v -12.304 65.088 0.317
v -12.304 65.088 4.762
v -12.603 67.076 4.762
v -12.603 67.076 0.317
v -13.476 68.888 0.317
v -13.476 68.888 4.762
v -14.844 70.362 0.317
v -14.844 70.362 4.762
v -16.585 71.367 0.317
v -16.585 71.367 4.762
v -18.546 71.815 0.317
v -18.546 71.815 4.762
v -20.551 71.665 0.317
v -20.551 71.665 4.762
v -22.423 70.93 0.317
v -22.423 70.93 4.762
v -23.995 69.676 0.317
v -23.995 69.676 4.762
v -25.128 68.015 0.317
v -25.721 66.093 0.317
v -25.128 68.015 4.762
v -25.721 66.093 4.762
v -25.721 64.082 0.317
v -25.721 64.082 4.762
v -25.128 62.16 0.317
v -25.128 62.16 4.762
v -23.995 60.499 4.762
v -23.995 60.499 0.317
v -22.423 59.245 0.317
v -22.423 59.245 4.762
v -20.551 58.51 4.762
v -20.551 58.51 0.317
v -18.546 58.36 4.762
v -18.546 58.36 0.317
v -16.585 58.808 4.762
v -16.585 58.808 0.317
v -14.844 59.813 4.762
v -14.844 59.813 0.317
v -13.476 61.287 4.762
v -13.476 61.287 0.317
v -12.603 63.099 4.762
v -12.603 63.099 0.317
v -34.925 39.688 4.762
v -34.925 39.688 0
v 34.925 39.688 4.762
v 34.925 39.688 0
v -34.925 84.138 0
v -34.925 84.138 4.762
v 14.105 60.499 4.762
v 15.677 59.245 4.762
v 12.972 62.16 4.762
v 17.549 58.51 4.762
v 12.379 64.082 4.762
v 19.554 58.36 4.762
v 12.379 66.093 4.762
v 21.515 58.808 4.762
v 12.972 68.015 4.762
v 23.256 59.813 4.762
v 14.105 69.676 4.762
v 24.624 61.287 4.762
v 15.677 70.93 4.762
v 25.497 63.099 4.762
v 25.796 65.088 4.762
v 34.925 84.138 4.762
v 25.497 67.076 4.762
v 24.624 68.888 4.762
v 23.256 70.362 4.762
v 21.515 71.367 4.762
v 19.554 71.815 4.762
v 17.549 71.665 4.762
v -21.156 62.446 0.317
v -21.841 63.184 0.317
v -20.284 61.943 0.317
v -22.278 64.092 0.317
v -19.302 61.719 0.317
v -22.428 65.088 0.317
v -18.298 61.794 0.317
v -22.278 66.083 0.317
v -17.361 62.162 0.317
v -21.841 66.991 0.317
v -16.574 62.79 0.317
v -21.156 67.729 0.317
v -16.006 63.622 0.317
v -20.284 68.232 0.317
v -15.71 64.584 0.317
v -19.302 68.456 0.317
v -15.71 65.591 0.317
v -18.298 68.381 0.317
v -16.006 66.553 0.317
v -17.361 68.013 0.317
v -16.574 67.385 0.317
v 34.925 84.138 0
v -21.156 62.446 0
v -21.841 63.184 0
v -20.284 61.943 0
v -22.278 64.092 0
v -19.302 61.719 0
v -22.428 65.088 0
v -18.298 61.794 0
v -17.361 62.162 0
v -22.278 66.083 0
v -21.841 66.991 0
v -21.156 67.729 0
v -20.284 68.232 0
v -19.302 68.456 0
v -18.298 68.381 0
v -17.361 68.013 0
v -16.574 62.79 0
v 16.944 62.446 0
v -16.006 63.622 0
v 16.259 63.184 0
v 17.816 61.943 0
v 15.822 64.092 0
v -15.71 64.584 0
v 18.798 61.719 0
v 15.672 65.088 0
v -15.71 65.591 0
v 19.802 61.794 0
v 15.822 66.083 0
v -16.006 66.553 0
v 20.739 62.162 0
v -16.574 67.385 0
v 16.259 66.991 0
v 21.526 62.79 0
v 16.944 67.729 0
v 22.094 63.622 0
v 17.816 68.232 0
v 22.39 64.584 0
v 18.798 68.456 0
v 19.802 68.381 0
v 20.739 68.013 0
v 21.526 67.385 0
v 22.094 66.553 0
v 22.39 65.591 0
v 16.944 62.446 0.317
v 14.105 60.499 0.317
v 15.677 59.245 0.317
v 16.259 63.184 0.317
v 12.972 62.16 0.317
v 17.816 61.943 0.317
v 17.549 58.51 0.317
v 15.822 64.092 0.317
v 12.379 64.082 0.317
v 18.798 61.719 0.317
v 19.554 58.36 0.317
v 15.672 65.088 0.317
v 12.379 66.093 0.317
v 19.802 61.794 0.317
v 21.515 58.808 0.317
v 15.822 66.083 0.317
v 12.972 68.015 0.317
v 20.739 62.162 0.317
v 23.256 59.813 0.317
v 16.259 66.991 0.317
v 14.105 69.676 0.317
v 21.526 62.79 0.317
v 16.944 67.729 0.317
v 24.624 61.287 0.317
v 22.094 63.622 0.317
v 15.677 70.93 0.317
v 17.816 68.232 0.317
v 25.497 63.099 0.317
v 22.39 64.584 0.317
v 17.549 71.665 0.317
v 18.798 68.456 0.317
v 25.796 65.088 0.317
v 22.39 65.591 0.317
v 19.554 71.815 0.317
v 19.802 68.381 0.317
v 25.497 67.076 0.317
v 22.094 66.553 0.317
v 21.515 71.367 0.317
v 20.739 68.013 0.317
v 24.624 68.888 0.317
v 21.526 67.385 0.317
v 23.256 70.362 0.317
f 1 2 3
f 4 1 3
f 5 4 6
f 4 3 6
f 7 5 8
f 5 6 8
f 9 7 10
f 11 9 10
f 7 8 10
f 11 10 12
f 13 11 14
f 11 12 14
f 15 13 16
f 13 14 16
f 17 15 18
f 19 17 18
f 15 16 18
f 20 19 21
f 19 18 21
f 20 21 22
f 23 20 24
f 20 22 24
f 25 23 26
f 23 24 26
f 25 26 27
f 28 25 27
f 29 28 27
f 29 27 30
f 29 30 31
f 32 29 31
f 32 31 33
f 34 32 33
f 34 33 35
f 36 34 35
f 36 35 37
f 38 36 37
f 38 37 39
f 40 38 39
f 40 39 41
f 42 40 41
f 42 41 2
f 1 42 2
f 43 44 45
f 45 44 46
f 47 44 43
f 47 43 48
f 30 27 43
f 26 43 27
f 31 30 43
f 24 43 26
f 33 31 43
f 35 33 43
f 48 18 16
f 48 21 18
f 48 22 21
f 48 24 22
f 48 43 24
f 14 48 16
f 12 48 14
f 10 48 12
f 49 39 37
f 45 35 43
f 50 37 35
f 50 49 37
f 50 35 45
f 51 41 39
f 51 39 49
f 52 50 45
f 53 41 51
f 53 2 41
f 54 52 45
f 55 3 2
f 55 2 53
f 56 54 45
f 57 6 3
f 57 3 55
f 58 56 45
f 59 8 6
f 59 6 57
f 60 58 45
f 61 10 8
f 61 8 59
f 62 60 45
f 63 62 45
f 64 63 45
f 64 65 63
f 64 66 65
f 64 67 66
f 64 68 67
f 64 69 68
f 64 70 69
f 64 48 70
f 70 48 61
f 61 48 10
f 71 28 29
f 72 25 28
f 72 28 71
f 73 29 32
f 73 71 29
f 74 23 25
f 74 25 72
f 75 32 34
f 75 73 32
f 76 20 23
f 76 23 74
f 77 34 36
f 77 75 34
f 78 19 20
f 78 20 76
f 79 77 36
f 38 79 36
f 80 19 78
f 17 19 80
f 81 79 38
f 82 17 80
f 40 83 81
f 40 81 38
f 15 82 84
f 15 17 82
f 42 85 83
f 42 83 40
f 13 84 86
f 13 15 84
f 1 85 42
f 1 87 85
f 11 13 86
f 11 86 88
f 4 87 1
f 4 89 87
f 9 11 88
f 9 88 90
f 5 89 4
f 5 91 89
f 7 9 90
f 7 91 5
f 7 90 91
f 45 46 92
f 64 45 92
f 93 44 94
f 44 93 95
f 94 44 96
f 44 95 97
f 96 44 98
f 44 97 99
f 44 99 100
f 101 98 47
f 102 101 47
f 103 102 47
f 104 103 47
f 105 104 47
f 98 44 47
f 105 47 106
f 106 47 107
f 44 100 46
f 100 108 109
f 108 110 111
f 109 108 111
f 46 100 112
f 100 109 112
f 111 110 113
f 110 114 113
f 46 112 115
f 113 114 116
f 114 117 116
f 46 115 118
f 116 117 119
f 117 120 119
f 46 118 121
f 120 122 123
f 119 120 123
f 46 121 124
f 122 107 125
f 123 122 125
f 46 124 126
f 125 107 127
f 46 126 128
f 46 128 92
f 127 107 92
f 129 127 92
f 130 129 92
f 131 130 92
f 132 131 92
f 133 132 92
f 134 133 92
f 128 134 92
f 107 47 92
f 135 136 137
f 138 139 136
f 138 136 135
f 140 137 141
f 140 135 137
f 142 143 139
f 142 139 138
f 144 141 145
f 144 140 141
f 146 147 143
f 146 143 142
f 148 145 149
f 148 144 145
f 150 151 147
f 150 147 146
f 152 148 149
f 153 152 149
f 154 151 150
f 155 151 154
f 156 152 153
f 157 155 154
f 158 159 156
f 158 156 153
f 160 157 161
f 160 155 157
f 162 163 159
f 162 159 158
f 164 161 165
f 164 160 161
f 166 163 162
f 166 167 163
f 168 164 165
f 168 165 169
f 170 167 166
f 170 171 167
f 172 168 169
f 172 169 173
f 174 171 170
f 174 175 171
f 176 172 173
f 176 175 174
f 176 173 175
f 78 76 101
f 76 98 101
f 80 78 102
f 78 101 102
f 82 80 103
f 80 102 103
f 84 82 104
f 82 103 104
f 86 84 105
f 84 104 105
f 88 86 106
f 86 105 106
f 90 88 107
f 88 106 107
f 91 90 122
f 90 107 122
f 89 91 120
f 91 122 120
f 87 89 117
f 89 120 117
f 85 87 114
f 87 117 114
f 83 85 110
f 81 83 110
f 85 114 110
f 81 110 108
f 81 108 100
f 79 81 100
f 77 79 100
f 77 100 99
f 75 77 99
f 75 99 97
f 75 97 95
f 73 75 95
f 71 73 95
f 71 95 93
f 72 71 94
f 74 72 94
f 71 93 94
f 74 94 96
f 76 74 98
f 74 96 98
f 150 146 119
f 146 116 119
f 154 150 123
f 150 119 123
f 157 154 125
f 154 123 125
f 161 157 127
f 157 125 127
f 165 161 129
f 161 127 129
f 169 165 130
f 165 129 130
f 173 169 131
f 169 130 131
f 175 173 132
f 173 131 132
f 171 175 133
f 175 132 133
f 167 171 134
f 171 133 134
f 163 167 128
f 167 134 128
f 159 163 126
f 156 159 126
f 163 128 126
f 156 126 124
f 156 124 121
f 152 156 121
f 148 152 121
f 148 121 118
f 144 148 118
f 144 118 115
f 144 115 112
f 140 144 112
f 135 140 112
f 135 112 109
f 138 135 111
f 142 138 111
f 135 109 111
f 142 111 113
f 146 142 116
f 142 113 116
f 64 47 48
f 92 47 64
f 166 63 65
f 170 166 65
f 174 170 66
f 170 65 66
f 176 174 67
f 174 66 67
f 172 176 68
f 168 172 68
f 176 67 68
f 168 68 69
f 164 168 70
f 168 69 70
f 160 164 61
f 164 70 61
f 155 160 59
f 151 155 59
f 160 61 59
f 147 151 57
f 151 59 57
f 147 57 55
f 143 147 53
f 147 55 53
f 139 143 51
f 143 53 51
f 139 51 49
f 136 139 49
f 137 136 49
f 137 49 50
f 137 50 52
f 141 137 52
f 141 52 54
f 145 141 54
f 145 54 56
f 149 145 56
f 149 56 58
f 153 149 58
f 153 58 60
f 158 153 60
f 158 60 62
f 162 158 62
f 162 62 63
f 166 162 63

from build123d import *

# Parameters (mm, degrees)
SKETCH1_W                                         = 69.85
SKETCH1_H                                         = 44.45
EXTRUDE1_DEPTH                                    = 4.7625
CBORE_FOR_1_4_PAN_HEAD_MACHINE_SCREW1_D           = 6.7564
CBORE_FOR_1_4_PAN_HEAD_MACHINE_SCREW1_CBORE_D     = 13.49248
CBORE_FOR_1_4_PAN_HEAD_MACHINE_SCREW1_CBORE_DEPTH = 4.445


with BuildPart() as part:
    # Sketch1 → Extrude1 (new body)
    with BuildSketch(Plane.XY):
        with Locations((0, 61.9125)):
            Rectangle(SKETCH1_W, SKETCH1_H)
    extrude(amount=EXTRUDE1_DEPTH)

    # CBORE for 1/4 Pan Head Machine Screw1 (through all)
    with Locations(Plane.XY.offset(4.7625)):
        with Locations((-19.05, 65.0875), (19.05, 65.0875)):
            CounterBoreHole(CBORE_FOR_1_4_PAN_HEAD_MACHINE_SCREW1_D / 2, CBORE_FOR_1_4_PAN_HEAD_MACHINE_SCREW1_CBORE_D / 2, CBORE_FOR_1_4_PAN_HEAD_MACHINE_SCREW1_CBORE_DEPTH)


solid = part.part
